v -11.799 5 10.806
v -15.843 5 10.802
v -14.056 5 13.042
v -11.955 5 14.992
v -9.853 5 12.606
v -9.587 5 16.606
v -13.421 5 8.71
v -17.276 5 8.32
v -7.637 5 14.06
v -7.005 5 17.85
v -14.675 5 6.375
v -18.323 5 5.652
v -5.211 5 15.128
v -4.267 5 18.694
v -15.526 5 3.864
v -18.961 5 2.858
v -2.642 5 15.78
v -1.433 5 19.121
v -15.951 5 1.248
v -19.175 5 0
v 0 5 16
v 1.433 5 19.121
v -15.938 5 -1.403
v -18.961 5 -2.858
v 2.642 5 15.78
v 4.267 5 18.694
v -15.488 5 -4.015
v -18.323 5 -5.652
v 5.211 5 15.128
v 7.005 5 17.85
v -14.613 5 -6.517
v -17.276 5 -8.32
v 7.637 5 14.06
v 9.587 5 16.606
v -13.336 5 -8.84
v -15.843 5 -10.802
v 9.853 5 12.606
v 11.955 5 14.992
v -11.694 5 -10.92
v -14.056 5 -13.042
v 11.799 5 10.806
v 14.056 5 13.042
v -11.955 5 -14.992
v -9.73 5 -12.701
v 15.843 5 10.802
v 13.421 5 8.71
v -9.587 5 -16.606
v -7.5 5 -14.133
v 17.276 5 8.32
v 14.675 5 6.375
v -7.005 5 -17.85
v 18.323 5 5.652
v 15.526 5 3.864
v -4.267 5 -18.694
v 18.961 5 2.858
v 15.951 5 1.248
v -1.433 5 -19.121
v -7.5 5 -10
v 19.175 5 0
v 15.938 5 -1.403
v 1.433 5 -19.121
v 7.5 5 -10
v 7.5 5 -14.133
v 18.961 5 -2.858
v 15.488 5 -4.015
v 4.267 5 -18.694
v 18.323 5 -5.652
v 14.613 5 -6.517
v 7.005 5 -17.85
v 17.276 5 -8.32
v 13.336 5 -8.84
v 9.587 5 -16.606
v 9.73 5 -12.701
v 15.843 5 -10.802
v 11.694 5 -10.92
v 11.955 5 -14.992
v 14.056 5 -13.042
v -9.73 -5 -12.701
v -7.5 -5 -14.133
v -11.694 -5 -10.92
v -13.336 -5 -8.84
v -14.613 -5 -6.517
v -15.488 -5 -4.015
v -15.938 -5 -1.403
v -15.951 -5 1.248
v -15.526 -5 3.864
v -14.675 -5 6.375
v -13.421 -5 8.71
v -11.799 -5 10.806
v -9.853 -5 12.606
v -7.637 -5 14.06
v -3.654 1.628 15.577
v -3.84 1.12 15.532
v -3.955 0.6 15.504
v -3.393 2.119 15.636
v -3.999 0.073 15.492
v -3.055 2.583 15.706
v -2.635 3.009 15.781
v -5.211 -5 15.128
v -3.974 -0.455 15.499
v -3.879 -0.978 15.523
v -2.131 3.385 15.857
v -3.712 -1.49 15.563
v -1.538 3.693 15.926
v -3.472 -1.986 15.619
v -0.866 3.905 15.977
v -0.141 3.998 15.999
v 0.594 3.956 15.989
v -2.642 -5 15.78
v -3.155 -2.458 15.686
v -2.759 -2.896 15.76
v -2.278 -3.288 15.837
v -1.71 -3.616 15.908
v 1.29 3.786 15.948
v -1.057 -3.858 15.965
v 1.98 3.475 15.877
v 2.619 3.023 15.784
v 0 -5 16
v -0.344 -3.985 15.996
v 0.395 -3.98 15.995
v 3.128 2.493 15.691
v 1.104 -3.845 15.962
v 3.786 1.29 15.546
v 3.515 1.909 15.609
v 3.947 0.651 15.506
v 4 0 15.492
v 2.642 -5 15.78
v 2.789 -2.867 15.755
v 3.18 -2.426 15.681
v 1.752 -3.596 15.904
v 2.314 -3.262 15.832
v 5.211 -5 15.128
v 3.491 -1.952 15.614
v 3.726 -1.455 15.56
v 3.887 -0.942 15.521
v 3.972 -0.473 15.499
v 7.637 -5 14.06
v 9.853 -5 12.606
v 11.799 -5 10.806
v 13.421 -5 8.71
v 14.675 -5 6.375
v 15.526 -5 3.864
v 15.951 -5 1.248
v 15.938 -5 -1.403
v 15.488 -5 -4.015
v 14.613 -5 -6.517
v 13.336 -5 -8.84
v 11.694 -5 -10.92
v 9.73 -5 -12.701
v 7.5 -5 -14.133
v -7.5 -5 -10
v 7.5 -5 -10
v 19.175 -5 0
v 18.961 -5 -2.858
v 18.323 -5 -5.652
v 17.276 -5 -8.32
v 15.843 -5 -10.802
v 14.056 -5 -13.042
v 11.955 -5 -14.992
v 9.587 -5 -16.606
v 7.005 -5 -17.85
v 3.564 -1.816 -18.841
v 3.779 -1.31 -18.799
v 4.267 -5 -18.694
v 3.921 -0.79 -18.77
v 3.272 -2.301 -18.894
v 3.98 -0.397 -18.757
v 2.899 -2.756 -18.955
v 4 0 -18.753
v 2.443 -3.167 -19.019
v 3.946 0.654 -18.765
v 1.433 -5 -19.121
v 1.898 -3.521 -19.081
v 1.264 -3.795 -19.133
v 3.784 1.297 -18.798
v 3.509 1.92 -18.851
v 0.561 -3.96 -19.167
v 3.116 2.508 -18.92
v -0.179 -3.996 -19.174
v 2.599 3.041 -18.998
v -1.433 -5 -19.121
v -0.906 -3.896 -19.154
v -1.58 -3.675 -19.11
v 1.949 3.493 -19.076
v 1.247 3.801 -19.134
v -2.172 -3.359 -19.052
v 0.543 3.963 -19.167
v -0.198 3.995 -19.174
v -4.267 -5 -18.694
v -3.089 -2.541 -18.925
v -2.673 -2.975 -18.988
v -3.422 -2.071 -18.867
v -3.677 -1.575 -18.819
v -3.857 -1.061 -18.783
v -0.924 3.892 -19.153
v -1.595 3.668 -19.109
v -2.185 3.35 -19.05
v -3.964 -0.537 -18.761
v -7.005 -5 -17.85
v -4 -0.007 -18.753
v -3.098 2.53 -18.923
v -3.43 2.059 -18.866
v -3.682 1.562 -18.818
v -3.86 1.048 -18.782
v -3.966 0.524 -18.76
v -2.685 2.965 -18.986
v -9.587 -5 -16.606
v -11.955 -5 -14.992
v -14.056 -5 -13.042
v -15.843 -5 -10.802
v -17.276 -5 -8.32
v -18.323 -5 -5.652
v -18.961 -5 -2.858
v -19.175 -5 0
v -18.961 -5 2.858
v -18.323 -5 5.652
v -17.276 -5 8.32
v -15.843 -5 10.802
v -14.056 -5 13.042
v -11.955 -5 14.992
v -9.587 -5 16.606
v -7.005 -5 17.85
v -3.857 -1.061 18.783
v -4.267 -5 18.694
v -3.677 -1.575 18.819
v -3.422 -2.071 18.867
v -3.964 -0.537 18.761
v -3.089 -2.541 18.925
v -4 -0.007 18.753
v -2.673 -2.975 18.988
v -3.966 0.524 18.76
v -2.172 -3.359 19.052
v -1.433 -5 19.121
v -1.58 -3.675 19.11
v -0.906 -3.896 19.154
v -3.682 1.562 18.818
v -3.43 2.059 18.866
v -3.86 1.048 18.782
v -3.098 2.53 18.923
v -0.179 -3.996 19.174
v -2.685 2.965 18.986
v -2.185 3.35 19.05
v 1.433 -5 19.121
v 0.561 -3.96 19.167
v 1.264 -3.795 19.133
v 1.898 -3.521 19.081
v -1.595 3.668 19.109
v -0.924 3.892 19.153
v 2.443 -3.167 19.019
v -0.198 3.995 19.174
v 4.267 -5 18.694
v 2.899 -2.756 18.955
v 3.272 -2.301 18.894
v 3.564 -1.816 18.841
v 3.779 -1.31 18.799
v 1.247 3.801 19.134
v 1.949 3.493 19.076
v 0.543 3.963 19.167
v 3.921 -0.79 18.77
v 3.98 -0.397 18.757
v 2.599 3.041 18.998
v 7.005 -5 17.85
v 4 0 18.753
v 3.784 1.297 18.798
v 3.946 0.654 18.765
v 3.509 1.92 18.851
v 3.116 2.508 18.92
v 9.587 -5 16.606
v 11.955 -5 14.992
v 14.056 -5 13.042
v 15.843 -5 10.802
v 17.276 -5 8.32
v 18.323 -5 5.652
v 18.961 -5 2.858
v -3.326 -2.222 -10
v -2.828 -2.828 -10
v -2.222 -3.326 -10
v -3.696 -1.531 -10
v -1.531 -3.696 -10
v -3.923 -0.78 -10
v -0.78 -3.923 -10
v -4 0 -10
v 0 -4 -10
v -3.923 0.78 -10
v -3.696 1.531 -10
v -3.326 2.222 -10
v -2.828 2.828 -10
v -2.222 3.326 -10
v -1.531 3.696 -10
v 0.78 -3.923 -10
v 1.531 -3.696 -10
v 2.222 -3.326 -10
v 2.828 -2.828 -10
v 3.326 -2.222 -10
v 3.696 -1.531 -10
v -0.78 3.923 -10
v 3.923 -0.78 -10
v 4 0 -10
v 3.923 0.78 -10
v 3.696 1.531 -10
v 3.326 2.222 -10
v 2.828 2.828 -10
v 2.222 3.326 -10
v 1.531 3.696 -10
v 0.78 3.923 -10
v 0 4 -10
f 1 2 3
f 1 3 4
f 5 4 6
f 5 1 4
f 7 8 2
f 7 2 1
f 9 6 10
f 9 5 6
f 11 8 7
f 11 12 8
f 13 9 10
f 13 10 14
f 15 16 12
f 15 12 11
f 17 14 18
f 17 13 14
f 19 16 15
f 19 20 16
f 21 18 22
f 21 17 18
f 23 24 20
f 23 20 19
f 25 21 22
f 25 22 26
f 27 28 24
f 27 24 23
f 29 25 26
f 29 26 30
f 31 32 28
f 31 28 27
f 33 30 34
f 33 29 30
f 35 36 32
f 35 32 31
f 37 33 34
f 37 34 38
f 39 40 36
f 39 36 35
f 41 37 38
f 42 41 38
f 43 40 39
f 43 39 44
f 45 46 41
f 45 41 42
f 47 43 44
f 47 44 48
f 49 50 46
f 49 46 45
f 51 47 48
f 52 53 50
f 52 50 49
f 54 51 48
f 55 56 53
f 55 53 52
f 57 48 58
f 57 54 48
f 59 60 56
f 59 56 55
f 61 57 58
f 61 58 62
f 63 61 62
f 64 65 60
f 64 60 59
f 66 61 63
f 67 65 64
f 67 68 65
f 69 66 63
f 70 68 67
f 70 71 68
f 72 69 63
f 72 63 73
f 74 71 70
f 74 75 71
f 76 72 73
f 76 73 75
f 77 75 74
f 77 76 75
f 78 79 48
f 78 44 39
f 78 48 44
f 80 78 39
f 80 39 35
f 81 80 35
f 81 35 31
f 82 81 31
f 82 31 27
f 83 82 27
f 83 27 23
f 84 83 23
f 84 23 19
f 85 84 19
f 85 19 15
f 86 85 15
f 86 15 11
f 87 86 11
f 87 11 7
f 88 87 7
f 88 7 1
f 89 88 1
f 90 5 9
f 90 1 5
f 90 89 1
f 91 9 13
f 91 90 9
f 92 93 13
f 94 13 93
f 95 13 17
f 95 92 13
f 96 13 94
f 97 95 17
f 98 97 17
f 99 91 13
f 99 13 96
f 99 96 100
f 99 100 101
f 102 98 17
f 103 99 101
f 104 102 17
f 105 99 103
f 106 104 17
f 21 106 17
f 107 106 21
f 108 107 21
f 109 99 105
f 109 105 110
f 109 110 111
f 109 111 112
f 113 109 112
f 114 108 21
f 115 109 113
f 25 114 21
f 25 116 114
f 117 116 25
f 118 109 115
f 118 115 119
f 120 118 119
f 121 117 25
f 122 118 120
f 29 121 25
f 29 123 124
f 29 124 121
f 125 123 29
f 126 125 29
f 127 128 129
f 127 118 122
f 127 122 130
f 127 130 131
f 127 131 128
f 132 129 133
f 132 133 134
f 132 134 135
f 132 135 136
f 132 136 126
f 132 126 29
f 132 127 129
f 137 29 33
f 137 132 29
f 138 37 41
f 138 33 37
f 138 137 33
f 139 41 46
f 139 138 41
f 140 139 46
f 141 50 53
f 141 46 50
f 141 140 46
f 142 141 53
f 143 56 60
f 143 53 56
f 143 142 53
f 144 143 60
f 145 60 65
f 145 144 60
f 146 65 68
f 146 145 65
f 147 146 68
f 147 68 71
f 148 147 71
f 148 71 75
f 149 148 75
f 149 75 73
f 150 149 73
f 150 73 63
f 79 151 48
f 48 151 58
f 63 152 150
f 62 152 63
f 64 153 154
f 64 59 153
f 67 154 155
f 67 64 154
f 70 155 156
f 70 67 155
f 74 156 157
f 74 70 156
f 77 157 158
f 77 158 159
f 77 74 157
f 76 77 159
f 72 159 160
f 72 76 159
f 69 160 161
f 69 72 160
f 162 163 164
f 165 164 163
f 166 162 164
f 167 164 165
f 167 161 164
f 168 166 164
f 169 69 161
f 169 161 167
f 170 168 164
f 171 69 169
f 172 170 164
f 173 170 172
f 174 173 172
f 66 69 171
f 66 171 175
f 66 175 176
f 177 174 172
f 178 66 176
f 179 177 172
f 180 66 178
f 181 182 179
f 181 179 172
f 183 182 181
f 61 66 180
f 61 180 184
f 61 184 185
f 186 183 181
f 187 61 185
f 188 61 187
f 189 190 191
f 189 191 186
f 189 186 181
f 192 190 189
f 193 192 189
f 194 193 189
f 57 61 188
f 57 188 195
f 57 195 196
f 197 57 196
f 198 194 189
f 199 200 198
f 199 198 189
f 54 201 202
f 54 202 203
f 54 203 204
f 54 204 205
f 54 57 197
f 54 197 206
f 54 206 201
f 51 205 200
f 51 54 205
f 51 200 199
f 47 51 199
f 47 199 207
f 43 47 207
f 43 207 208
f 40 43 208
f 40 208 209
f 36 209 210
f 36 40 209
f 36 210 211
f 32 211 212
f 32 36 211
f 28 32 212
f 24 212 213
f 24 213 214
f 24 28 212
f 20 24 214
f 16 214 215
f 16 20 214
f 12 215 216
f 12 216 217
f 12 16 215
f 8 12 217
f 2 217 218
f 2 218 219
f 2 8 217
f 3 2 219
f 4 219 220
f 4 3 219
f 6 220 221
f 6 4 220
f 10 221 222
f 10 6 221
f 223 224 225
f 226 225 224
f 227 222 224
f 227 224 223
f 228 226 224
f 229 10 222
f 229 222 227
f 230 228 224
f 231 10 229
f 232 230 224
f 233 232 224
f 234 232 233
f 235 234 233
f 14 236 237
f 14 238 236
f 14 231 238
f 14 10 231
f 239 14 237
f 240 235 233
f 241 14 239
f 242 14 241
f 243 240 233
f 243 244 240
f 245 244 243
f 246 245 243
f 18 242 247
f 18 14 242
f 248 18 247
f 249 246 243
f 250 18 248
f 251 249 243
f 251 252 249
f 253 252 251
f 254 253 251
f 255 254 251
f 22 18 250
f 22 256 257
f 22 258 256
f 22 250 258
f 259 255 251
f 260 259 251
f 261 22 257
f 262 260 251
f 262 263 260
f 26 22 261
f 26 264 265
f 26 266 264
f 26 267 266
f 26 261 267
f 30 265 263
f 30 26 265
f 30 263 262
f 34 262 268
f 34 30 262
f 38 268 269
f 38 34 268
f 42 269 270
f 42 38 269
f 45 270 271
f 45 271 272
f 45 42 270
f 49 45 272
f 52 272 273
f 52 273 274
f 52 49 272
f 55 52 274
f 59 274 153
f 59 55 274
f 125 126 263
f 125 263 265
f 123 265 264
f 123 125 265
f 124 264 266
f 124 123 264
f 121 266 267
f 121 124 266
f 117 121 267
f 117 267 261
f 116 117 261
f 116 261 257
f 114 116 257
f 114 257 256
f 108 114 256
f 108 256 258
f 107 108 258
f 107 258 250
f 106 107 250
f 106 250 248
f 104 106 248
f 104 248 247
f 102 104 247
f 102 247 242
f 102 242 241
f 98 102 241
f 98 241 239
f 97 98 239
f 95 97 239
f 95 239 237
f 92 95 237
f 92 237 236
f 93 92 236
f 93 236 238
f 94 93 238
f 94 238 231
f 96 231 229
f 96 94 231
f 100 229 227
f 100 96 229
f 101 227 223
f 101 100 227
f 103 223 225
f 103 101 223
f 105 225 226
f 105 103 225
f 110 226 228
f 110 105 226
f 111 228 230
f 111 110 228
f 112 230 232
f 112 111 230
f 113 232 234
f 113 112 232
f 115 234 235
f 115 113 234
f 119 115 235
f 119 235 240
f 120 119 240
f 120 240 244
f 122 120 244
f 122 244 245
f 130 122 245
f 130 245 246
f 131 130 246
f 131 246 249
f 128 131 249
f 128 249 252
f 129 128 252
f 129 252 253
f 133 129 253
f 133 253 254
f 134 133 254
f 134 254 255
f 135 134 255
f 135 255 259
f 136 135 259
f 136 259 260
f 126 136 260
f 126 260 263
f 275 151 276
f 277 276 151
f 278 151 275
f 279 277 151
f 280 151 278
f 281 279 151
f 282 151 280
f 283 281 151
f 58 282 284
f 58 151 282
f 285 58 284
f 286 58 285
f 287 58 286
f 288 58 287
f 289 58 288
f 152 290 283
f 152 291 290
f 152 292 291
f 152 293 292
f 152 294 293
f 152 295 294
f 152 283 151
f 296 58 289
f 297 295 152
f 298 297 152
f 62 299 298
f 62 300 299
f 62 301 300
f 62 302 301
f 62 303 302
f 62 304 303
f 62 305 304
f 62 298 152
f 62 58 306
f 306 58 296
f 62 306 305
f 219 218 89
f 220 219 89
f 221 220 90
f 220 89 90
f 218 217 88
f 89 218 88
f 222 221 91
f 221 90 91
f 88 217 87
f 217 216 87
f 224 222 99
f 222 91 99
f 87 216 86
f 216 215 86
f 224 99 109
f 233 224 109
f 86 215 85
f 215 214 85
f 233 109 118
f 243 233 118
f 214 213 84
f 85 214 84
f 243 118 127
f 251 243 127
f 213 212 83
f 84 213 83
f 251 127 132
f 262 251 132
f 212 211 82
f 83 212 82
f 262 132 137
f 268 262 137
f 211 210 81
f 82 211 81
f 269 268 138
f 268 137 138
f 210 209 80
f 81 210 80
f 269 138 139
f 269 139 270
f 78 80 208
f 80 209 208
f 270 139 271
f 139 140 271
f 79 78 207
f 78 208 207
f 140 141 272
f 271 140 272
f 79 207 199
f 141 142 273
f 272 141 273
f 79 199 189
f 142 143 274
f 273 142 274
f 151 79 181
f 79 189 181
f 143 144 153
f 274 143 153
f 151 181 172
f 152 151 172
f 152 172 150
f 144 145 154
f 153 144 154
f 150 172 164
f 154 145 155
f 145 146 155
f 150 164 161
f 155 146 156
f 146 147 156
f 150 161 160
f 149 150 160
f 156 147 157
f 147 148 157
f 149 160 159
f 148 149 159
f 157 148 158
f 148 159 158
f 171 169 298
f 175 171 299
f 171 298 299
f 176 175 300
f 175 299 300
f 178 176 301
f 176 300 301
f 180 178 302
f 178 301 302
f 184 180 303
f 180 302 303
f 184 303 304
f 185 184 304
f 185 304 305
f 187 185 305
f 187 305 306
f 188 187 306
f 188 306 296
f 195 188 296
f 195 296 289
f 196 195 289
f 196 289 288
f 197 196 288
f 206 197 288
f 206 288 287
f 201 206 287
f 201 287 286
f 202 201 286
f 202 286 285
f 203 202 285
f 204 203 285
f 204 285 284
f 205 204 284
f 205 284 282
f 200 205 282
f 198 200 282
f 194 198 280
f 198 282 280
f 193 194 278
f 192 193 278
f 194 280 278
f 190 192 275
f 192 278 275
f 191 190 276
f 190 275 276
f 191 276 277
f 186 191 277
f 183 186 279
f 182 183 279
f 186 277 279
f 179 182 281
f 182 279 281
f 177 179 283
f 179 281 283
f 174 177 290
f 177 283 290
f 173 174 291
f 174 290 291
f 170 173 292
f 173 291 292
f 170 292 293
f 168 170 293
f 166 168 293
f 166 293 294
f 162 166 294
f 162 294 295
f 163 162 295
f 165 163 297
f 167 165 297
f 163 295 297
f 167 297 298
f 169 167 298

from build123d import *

# Parameters (mm, degrees)
SKETCH6_R               = 19.175
SKETCH6_R_2             = 16
BOSS_EXTRUDE4_DEPTH     = 5
BOSS_EXTRUDE6_REACH     = 11.175
SKETCH8_W               = 15
SKETCH8_H               = 10
SKETCH7_2_R             = 4
CUT_EXTRUDE1_DEPTH      = 16.475
CUT_EXTRUDE1_DEPTH_BACK = 23.875


with BuildPart() as part:
    # Sketch6 → Boss-Extrude4 (new body, symmetric)
    with BuildSketch(Plane(origin=(0, 0, 0), x_dir=(1, 0, 0), z_dir=(0, 1, 0))):
        Circle(SKETCH6_R)
        Circle(SKETCH6_R_2, mode=Mode.SUBTRACT)
    extrude(amount=BOSS_EXTRUDE4_DEPTH, both=True)

    # Sketch8 → Boss-Extrude6 (add, up to next)
    with BuildSketch(Plane.XY.offset(-10), mode=Mode.PRIVATE) as boss_extrude6_sk1:
        Rectangle(SKETCH8_W, SKETCH8_H)
    boss_extrude6_tool1 = extrude(boss_extrude6_sk1.sketch, amount=-BOSS_EXTRUDE6_REACH, mode=Mode.PRIVATE) - part.part
    add(boss_extrude6_tool1.solids().sort_by_distance((0, 0, -10))[0])

    # Sketch7<2> → Cut-Extrude1 (cut, two sides)
    with BuildSketch(Plane.XY.offset(3.7)) as cut_extrude1_sk:
        Circle(SKETCH7_2_R)
    extrude(amount=CUT_EXTRUDE1_DEPTH, mode=Mode.SUBTRACT)
    extrude(cut_extrude1_sk.sketch, amount=-CUT_EXTRUDE1_DEPTH_BACK, mode=Mode.SUBTRACT)


solid = part.part
